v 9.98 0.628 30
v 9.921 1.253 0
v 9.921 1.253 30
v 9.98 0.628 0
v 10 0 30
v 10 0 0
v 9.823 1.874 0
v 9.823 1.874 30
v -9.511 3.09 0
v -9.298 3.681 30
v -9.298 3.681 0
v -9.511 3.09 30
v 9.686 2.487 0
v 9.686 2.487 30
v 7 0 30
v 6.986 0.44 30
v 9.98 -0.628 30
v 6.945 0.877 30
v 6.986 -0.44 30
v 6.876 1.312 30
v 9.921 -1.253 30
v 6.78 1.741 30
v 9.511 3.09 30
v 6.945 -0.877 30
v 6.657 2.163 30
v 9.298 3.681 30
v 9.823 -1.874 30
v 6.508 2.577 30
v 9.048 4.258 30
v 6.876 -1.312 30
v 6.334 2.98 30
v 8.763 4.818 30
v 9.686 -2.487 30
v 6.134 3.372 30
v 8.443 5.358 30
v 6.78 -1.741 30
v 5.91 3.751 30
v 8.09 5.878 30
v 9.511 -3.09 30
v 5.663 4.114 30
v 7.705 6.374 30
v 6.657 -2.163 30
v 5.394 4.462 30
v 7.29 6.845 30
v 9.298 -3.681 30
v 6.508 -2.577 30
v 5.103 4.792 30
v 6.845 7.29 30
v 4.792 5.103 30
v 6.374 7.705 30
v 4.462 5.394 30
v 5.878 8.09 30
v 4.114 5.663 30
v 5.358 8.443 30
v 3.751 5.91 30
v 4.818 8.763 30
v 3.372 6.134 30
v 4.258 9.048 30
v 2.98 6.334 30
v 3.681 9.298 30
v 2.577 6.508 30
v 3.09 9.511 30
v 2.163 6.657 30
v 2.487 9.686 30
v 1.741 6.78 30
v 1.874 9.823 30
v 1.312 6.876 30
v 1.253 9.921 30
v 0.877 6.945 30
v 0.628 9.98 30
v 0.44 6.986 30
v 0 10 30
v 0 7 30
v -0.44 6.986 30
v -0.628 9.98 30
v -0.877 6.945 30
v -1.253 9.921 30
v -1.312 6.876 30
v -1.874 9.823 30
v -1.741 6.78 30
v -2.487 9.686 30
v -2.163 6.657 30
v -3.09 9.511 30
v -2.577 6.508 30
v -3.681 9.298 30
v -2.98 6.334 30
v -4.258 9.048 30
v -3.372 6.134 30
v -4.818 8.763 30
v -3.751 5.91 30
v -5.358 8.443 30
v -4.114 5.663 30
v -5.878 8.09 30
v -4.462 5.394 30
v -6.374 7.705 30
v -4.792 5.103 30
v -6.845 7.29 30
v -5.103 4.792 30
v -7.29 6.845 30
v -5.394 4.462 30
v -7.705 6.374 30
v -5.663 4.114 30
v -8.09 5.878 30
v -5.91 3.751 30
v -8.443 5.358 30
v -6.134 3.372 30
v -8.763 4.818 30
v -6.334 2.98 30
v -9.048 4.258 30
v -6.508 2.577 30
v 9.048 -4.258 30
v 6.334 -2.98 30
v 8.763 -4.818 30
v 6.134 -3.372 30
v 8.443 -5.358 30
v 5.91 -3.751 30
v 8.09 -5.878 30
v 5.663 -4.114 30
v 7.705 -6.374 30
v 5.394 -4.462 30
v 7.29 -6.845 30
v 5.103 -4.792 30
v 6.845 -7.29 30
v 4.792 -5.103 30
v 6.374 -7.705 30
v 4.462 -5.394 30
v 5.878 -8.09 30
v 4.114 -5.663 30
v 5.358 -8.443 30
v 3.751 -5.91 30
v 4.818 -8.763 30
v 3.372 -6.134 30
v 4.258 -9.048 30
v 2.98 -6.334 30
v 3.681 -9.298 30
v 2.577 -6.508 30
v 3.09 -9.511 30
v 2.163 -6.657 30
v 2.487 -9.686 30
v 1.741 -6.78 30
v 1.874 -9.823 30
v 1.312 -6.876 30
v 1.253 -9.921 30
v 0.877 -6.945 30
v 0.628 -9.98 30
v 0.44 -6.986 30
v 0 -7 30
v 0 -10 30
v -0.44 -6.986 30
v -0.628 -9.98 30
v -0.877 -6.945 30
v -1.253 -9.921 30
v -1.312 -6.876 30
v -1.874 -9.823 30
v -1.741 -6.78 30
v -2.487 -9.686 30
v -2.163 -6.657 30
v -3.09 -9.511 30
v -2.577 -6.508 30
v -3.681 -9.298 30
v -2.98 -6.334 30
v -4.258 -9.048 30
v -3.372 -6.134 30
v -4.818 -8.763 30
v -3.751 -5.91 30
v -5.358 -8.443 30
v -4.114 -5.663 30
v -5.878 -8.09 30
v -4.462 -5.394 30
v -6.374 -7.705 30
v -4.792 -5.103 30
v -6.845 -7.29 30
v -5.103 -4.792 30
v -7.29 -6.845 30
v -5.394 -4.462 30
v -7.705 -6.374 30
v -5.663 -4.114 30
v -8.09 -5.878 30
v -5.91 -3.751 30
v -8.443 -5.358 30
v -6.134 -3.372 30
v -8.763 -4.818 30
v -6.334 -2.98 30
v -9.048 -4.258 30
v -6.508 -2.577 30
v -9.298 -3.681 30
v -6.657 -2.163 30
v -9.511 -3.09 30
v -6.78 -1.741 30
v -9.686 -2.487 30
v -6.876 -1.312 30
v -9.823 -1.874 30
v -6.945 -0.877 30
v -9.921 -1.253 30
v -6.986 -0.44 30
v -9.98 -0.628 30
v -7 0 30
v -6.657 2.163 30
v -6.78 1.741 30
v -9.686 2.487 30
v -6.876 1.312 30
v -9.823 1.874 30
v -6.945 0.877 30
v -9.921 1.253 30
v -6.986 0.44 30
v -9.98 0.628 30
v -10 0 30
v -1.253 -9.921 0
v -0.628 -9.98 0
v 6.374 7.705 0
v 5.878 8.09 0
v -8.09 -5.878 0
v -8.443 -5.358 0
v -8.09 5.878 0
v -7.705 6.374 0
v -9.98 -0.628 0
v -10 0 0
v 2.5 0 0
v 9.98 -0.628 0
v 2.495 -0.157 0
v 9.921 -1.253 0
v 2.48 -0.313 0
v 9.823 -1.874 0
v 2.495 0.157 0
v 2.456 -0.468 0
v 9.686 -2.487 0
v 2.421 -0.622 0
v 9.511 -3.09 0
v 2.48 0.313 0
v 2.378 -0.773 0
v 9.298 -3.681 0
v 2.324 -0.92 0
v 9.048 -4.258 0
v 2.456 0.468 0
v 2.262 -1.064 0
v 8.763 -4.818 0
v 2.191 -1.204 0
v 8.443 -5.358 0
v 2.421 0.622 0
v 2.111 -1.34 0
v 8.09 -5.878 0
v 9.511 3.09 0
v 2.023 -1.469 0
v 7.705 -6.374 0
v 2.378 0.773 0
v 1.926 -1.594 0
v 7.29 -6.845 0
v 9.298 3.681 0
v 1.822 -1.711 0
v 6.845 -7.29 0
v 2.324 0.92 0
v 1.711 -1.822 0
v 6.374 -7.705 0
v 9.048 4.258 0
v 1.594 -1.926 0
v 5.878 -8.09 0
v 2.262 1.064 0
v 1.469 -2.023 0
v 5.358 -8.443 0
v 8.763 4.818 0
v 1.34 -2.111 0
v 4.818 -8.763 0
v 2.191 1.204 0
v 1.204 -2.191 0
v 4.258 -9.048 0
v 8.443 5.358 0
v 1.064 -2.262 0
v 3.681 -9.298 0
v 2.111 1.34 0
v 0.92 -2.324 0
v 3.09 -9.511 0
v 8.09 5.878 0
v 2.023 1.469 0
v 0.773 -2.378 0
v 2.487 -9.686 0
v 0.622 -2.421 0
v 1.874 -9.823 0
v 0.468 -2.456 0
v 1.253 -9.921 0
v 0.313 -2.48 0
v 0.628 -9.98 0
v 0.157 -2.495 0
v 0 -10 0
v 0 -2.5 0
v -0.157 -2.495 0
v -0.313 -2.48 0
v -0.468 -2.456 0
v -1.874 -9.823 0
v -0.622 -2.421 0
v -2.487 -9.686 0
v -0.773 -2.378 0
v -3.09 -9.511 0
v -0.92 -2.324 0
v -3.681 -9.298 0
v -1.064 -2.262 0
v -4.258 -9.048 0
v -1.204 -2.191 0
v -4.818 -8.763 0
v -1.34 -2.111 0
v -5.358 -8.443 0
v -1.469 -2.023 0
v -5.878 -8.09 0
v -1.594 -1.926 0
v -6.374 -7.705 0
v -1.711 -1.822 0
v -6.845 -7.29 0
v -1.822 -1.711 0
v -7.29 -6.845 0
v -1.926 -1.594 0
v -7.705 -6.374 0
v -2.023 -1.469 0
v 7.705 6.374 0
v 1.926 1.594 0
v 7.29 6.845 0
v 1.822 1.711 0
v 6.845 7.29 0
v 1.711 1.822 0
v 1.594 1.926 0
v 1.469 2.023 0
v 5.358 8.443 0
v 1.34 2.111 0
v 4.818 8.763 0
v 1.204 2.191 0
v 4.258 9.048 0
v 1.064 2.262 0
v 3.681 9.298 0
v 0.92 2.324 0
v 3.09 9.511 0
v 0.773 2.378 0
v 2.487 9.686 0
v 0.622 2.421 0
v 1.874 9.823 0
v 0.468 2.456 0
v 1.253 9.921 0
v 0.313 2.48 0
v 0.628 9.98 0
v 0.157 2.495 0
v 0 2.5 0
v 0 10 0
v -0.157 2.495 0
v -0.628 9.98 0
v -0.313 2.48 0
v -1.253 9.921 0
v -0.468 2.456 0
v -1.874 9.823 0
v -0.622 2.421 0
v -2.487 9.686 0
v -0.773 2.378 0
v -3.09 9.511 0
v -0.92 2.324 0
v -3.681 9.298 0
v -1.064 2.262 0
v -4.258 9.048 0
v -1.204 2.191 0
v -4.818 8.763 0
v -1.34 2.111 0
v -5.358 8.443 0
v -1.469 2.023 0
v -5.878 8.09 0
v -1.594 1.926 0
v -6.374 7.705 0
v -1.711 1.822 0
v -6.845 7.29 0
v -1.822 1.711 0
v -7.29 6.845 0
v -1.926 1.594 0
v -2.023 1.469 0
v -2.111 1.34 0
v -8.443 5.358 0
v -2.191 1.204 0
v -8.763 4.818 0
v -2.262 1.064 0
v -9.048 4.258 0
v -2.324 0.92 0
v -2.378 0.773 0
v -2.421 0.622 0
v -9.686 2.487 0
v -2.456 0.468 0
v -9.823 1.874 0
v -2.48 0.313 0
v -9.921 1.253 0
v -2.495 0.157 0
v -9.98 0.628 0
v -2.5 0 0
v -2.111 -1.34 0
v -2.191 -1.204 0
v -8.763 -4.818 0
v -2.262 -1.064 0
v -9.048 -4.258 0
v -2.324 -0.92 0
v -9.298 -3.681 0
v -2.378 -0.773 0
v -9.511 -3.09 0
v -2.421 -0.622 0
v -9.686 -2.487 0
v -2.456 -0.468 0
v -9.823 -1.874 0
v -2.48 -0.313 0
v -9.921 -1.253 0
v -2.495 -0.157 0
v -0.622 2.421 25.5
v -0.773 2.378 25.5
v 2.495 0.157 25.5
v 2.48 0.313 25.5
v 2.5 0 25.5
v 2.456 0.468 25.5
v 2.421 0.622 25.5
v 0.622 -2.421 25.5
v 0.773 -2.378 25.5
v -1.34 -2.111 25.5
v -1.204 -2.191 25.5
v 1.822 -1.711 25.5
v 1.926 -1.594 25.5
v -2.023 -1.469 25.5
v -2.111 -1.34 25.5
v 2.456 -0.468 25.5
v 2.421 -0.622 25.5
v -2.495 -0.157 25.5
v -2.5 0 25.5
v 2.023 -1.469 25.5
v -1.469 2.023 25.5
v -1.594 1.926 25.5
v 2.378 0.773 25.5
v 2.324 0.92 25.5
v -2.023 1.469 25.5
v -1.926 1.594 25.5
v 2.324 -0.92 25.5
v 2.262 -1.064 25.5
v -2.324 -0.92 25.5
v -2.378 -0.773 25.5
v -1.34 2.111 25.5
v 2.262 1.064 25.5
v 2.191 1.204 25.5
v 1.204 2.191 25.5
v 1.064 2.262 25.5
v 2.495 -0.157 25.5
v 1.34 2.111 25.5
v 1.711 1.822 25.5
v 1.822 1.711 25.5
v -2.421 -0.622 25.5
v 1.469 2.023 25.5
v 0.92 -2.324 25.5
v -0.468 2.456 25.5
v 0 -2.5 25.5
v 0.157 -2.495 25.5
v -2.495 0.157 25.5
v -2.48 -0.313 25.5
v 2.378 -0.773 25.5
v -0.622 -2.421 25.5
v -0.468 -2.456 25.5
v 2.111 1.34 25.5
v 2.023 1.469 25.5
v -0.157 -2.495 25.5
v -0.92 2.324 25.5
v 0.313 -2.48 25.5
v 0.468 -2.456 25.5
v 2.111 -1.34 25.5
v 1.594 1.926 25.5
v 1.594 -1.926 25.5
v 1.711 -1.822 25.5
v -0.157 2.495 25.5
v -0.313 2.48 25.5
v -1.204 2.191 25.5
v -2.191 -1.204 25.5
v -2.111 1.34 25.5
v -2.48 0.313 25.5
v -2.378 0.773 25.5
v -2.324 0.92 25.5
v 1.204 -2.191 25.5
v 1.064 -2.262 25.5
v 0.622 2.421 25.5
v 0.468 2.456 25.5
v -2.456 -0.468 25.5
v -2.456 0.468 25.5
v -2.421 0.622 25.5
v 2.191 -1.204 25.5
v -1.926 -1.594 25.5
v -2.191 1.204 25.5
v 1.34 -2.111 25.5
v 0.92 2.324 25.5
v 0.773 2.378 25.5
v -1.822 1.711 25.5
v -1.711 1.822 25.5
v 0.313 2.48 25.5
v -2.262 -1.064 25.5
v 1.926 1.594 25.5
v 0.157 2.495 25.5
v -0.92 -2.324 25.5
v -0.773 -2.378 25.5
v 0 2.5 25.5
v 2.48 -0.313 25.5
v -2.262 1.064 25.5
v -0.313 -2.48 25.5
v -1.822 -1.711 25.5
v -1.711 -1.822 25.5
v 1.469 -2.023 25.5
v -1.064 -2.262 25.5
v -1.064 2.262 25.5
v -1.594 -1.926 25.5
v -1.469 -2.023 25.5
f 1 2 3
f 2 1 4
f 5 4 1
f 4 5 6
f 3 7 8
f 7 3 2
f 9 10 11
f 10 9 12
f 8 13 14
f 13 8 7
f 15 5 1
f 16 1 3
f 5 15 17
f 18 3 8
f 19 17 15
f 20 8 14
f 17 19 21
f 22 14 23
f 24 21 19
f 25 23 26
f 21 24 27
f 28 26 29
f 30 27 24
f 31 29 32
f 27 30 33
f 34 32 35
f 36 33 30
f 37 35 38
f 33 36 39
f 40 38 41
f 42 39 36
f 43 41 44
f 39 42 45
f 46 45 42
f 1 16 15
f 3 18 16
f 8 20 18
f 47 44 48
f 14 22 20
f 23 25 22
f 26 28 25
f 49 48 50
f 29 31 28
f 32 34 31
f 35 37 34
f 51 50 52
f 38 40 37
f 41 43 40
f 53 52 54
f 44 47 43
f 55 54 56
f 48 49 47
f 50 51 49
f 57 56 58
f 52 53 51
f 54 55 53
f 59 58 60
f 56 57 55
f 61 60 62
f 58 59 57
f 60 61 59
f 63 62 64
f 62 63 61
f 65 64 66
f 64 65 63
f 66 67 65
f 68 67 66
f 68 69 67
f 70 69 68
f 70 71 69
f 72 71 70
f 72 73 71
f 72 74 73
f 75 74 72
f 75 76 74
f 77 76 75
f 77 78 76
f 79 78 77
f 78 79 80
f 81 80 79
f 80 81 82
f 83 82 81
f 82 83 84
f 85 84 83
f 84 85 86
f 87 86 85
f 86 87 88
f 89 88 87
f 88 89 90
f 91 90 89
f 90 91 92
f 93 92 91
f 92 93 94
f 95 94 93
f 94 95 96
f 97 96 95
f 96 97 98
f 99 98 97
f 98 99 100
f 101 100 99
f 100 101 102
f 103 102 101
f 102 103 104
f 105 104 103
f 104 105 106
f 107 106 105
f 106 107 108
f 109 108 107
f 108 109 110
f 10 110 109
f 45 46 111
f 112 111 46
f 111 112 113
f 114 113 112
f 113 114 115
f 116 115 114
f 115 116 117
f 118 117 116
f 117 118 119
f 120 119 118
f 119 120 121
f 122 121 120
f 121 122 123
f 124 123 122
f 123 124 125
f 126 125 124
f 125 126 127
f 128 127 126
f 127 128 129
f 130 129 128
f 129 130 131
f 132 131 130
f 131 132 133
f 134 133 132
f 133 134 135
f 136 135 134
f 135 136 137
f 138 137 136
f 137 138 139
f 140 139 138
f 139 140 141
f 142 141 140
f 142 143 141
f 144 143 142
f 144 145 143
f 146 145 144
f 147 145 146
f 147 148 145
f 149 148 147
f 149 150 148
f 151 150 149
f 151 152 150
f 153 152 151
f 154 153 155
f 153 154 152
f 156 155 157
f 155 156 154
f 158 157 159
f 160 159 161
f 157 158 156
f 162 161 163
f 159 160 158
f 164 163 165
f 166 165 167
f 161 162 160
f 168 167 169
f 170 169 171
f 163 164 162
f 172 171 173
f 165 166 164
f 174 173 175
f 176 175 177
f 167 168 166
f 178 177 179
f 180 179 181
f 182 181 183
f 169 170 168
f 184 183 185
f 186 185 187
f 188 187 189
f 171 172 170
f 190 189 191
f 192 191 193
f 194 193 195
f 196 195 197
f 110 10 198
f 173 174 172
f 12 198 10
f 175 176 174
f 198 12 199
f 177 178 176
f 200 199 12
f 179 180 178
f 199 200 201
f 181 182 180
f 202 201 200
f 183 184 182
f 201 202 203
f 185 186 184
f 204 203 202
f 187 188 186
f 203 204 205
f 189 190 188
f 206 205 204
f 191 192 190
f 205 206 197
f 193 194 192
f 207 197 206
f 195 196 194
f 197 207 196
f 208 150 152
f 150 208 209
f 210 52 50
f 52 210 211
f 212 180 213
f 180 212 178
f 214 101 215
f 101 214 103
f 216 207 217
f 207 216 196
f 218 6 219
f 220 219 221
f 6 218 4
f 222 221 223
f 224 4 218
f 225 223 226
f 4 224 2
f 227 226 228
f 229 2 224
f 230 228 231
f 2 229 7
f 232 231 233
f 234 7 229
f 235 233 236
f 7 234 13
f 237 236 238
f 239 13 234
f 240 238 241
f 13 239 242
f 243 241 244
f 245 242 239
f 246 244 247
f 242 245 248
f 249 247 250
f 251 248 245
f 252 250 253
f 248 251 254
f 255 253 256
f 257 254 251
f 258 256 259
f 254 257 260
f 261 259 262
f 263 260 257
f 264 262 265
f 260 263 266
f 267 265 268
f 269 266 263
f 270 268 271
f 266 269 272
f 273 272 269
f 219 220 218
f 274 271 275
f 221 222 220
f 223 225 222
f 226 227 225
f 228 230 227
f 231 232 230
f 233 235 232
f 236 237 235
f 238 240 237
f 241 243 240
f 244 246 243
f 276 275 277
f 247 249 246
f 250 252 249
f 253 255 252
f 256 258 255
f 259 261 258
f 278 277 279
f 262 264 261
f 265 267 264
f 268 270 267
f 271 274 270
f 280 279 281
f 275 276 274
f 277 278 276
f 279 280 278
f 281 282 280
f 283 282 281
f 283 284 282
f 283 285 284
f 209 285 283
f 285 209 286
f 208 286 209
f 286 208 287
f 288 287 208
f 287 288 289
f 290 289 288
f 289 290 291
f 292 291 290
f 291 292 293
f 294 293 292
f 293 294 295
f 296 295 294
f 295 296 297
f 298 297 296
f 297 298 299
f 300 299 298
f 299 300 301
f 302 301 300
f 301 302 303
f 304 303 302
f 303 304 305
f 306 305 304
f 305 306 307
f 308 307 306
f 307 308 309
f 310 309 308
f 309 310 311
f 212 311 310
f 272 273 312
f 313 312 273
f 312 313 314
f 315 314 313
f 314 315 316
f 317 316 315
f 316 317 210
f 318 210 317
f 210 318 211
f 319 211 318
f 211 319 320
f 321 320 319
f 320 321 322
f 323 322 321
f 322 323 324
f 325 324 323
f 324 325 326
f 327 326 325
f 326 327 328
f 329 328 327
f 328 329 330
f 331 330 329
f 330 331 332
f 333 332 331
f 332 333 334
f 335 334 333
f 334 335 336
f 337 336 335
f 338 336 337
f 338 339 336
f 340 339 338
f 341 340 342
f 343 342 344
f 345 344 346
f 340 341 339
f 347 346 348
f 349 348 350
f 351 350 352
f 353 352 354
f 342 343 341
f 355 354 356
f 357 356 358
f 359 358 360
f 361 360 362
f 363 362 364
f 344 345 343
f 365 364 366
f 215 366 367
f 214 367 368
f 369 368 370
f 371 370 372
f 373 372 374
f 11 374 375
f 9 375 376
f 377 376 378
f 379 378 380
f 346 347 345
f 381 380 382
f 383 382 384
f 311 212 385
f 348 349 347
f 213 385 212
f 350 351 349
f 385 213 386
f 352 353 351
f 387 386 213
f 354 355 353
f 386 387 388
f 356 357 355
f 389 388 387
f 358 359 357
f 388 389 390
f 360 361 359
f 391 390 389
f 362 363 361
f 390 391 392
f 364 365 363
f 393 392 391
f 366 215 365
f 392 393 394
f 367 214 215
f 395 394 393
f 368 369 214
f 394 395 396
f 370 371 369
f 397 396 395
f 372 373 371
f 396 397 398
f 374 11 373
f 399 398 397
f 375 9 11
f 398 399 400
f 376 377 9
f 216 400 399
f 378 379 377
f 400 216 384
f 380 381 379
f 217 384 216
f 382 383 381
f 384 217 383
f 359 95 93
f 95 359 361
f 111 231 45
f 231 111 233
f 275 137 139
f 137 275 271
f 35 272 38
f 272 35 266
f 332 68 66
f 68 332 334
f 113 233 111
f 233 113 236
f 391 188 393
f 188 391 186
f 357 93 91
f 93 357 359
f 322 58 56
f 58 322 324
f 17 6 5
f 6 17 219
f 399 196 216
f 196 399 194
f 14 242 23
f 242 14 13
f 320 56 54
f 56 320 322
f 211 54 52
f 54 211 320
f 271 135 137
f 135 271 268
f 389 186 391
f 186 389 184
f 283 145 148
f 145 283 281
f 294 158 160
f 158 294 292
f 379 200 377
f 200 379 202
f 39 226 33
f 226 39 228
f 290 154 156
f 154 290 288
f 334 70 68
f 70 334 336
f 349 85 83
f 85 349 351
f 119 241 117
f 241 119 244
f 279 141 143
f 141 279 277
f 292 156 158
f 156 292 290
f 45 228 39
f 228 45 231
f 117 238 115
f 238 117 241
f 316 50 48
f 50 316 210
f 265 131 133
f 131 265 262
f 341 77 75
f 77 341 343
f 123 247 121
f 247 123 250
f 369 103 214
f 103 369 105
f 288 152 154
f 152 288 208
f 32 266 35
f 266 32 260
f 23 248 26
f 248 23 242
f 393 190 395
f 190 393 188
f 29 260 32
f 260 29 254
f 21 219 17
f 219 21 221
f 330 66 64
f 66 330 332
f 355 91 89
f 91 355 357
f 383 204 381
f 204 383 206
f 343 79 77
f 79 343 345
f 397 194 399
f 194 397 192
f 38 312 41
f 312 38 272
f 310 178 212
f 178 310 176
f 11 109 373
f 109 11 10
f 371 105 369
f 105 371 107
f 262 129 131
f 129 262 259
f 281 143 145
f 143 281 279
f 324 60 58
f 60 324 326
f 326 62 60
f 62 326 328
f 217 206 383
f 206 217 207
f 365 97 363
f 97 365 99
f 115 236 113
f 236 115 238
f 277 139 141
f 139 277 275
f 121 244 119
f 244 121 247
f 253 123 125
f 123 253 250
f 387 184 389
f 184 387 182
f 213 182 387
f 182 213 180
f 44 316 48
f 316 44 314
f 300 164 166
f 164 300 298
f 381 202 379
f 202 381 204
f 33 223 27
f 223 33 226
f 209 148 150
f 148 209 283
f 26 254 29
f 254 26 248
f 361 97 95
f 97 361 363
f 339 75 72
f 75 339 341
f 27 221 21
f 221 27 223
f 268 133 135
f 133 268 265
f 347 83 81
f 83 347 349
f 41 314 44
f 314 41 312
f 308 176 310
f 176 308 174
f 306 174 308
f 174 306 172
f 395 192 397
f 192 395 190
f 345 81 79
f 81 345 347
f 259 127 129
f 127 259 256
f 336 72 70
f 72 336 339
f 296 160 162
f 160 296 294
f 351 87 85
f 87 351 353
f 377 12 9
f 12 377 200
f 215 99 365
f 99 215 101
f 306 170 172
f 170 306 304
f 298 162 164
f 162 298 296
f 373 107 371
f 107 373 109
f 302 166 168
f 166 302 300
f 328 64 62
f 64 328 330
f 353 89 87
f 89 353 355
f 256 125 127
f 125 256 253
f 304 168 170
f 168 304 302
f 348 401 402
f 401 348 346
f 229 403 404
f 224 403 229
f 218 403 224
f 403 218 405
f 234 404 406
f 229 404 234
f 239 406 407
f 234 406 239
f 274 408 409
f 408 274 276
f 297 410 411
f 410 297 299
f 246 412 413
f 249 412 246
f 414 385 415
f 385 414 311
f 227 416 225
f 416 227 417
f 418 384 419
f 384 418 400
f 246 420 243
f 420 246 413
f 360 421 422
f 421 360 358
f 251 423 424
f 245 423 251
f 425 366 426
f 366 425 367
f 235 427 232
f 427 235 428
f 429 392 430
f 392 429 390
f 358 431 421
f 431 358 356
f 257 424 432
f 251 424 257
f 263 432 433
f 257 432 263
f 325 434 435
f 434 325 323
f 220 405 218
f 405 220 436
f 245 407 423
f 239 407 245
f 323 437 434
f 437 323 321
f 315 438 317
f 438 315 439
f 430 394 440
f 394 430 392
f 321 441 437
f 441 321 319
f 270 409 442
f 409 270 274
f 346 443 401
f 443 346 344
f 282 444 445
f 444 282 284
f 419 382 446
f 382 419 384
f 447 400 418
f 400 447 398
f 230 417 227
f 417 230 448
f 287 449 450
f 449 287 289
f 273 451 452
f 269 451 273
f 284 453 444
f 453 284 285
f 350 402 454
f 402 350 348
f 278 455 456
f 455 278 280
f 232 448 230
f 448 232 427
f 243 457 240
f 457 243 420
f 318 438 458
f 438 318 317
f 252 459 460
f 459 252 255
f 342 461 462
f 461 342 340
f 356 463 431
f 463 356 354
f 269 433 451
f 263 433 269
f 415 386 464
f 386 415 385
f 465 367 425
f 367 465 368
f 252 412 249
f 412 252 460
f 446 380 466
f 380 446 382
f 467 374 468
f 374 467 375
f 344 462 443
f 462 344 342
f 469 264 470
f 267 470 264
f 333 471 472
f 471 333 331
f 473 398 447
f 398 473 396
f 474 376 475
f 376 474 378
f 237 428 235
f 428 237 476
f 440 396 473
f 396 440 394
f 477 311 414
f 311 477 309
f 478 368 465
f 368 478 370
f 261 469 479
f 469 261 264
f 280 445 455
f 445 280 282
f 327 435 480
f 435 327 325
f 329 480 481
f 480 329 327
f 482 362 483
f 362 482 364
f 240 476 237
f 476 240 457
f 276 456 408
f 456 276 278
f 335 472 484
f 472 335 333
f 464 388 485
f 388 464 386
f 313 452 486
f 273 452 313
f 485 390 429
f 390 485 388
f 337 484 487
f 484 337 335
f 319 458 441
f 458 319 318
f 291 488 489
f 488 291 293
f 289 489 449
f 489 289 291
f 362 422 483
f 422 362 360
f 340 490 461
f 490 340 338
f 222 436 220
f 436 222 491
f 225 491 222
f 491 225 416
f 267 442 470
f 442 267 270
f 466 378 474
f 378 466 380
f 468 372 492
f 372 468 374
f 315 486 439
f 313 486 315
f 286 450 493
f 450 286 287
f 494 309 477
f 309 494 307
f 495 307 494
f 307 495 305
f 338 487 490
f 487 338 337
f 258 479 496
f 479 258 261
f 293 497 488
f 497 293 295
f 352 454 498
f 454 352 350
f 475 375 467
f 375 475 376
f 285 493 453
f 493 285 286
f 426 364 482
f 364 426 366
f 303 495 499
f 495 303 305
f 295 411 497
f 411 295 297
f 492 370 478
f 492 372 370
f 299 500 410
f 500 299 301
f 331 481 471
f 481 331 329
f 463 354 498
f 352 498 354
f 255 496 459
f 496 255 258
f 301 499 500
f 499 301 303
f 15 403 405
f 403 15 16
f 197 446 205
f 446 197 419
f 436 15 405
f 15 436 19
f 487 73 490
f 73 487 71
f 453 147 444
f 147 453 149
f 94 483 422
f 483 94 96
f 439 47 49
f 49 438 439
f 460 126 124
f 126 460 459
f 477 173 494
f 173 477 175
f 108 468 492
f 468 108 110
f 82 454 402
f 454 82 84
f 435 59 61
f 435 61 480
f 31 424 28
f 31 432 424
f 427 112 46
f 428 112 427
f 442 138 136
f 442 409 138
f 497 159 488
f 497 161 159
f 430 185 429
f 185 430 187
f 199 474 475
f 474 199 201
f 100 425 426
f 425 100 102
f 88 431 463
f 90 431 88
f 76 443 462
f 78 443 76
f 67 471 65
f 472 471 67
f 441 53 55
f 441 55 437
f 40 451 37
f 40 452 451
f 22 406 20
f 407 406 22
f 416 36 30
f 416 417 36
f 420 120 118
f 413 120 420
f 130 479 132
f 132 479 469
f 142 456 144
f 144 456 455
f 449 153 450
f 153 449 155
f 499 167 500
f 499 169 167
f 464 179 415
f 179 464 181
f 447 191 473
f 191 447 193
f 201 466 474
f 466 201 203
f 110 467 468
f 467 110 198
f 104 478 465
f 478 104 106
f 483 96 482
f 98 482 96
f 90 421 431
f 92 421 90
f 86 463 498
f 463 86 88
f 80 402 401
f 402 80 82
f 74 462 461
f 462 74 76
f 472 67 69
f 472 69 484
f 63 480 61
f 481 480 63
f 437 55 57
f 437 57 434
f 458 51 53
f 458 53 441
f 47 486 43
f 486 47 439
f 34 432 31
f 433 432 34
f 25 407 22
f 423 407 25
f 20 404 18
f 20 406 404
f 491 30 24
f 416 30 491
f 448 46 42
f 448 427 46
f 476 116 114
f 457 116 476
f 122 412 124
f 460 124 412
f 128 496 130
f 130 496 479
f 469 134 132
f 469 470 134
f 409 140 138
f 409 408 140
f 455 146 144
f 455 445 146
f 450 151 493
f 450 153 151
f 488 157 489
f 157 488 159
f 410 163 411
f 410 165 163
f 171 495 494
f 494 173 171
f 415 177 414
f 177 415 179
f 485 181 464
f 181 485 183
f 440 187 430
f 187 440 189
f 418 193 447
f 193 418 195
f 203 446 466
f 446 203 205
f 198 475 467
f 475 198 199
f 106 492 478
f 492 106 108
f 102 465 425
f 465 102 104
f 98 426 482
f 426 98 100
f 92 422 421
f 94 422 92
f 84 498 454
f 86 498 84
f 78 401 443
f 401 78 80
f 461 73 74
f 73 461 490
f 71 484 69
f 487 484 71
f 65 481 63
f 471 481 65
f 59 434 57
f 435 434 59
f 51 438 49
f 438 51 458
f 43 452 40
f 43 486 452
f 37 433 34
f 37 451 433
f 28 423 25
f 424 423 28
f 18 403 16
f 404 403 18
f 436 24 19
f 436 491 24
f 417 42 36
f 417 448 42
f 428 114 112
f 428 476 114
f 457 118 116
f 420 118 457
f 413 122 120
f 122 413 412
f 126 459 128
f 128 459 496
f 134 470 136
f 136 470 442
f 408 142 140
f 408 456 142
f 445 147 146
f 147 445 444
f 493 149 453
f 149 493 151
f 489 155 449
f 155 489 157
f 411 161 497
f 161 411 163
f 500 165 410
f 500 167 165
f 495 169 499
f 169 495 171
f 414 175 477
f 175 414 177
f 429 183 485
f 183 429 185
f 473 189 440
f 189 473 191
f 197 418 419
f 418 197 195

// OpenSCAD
$fn = 100;

difference(){
cylinder(30, 10, 10);
	translate([0,0,-1])
		cylinder(35, 2.5, 2.5);
	#translate([0,0,23])
		cylinder(10, 0, 10);
	
}
